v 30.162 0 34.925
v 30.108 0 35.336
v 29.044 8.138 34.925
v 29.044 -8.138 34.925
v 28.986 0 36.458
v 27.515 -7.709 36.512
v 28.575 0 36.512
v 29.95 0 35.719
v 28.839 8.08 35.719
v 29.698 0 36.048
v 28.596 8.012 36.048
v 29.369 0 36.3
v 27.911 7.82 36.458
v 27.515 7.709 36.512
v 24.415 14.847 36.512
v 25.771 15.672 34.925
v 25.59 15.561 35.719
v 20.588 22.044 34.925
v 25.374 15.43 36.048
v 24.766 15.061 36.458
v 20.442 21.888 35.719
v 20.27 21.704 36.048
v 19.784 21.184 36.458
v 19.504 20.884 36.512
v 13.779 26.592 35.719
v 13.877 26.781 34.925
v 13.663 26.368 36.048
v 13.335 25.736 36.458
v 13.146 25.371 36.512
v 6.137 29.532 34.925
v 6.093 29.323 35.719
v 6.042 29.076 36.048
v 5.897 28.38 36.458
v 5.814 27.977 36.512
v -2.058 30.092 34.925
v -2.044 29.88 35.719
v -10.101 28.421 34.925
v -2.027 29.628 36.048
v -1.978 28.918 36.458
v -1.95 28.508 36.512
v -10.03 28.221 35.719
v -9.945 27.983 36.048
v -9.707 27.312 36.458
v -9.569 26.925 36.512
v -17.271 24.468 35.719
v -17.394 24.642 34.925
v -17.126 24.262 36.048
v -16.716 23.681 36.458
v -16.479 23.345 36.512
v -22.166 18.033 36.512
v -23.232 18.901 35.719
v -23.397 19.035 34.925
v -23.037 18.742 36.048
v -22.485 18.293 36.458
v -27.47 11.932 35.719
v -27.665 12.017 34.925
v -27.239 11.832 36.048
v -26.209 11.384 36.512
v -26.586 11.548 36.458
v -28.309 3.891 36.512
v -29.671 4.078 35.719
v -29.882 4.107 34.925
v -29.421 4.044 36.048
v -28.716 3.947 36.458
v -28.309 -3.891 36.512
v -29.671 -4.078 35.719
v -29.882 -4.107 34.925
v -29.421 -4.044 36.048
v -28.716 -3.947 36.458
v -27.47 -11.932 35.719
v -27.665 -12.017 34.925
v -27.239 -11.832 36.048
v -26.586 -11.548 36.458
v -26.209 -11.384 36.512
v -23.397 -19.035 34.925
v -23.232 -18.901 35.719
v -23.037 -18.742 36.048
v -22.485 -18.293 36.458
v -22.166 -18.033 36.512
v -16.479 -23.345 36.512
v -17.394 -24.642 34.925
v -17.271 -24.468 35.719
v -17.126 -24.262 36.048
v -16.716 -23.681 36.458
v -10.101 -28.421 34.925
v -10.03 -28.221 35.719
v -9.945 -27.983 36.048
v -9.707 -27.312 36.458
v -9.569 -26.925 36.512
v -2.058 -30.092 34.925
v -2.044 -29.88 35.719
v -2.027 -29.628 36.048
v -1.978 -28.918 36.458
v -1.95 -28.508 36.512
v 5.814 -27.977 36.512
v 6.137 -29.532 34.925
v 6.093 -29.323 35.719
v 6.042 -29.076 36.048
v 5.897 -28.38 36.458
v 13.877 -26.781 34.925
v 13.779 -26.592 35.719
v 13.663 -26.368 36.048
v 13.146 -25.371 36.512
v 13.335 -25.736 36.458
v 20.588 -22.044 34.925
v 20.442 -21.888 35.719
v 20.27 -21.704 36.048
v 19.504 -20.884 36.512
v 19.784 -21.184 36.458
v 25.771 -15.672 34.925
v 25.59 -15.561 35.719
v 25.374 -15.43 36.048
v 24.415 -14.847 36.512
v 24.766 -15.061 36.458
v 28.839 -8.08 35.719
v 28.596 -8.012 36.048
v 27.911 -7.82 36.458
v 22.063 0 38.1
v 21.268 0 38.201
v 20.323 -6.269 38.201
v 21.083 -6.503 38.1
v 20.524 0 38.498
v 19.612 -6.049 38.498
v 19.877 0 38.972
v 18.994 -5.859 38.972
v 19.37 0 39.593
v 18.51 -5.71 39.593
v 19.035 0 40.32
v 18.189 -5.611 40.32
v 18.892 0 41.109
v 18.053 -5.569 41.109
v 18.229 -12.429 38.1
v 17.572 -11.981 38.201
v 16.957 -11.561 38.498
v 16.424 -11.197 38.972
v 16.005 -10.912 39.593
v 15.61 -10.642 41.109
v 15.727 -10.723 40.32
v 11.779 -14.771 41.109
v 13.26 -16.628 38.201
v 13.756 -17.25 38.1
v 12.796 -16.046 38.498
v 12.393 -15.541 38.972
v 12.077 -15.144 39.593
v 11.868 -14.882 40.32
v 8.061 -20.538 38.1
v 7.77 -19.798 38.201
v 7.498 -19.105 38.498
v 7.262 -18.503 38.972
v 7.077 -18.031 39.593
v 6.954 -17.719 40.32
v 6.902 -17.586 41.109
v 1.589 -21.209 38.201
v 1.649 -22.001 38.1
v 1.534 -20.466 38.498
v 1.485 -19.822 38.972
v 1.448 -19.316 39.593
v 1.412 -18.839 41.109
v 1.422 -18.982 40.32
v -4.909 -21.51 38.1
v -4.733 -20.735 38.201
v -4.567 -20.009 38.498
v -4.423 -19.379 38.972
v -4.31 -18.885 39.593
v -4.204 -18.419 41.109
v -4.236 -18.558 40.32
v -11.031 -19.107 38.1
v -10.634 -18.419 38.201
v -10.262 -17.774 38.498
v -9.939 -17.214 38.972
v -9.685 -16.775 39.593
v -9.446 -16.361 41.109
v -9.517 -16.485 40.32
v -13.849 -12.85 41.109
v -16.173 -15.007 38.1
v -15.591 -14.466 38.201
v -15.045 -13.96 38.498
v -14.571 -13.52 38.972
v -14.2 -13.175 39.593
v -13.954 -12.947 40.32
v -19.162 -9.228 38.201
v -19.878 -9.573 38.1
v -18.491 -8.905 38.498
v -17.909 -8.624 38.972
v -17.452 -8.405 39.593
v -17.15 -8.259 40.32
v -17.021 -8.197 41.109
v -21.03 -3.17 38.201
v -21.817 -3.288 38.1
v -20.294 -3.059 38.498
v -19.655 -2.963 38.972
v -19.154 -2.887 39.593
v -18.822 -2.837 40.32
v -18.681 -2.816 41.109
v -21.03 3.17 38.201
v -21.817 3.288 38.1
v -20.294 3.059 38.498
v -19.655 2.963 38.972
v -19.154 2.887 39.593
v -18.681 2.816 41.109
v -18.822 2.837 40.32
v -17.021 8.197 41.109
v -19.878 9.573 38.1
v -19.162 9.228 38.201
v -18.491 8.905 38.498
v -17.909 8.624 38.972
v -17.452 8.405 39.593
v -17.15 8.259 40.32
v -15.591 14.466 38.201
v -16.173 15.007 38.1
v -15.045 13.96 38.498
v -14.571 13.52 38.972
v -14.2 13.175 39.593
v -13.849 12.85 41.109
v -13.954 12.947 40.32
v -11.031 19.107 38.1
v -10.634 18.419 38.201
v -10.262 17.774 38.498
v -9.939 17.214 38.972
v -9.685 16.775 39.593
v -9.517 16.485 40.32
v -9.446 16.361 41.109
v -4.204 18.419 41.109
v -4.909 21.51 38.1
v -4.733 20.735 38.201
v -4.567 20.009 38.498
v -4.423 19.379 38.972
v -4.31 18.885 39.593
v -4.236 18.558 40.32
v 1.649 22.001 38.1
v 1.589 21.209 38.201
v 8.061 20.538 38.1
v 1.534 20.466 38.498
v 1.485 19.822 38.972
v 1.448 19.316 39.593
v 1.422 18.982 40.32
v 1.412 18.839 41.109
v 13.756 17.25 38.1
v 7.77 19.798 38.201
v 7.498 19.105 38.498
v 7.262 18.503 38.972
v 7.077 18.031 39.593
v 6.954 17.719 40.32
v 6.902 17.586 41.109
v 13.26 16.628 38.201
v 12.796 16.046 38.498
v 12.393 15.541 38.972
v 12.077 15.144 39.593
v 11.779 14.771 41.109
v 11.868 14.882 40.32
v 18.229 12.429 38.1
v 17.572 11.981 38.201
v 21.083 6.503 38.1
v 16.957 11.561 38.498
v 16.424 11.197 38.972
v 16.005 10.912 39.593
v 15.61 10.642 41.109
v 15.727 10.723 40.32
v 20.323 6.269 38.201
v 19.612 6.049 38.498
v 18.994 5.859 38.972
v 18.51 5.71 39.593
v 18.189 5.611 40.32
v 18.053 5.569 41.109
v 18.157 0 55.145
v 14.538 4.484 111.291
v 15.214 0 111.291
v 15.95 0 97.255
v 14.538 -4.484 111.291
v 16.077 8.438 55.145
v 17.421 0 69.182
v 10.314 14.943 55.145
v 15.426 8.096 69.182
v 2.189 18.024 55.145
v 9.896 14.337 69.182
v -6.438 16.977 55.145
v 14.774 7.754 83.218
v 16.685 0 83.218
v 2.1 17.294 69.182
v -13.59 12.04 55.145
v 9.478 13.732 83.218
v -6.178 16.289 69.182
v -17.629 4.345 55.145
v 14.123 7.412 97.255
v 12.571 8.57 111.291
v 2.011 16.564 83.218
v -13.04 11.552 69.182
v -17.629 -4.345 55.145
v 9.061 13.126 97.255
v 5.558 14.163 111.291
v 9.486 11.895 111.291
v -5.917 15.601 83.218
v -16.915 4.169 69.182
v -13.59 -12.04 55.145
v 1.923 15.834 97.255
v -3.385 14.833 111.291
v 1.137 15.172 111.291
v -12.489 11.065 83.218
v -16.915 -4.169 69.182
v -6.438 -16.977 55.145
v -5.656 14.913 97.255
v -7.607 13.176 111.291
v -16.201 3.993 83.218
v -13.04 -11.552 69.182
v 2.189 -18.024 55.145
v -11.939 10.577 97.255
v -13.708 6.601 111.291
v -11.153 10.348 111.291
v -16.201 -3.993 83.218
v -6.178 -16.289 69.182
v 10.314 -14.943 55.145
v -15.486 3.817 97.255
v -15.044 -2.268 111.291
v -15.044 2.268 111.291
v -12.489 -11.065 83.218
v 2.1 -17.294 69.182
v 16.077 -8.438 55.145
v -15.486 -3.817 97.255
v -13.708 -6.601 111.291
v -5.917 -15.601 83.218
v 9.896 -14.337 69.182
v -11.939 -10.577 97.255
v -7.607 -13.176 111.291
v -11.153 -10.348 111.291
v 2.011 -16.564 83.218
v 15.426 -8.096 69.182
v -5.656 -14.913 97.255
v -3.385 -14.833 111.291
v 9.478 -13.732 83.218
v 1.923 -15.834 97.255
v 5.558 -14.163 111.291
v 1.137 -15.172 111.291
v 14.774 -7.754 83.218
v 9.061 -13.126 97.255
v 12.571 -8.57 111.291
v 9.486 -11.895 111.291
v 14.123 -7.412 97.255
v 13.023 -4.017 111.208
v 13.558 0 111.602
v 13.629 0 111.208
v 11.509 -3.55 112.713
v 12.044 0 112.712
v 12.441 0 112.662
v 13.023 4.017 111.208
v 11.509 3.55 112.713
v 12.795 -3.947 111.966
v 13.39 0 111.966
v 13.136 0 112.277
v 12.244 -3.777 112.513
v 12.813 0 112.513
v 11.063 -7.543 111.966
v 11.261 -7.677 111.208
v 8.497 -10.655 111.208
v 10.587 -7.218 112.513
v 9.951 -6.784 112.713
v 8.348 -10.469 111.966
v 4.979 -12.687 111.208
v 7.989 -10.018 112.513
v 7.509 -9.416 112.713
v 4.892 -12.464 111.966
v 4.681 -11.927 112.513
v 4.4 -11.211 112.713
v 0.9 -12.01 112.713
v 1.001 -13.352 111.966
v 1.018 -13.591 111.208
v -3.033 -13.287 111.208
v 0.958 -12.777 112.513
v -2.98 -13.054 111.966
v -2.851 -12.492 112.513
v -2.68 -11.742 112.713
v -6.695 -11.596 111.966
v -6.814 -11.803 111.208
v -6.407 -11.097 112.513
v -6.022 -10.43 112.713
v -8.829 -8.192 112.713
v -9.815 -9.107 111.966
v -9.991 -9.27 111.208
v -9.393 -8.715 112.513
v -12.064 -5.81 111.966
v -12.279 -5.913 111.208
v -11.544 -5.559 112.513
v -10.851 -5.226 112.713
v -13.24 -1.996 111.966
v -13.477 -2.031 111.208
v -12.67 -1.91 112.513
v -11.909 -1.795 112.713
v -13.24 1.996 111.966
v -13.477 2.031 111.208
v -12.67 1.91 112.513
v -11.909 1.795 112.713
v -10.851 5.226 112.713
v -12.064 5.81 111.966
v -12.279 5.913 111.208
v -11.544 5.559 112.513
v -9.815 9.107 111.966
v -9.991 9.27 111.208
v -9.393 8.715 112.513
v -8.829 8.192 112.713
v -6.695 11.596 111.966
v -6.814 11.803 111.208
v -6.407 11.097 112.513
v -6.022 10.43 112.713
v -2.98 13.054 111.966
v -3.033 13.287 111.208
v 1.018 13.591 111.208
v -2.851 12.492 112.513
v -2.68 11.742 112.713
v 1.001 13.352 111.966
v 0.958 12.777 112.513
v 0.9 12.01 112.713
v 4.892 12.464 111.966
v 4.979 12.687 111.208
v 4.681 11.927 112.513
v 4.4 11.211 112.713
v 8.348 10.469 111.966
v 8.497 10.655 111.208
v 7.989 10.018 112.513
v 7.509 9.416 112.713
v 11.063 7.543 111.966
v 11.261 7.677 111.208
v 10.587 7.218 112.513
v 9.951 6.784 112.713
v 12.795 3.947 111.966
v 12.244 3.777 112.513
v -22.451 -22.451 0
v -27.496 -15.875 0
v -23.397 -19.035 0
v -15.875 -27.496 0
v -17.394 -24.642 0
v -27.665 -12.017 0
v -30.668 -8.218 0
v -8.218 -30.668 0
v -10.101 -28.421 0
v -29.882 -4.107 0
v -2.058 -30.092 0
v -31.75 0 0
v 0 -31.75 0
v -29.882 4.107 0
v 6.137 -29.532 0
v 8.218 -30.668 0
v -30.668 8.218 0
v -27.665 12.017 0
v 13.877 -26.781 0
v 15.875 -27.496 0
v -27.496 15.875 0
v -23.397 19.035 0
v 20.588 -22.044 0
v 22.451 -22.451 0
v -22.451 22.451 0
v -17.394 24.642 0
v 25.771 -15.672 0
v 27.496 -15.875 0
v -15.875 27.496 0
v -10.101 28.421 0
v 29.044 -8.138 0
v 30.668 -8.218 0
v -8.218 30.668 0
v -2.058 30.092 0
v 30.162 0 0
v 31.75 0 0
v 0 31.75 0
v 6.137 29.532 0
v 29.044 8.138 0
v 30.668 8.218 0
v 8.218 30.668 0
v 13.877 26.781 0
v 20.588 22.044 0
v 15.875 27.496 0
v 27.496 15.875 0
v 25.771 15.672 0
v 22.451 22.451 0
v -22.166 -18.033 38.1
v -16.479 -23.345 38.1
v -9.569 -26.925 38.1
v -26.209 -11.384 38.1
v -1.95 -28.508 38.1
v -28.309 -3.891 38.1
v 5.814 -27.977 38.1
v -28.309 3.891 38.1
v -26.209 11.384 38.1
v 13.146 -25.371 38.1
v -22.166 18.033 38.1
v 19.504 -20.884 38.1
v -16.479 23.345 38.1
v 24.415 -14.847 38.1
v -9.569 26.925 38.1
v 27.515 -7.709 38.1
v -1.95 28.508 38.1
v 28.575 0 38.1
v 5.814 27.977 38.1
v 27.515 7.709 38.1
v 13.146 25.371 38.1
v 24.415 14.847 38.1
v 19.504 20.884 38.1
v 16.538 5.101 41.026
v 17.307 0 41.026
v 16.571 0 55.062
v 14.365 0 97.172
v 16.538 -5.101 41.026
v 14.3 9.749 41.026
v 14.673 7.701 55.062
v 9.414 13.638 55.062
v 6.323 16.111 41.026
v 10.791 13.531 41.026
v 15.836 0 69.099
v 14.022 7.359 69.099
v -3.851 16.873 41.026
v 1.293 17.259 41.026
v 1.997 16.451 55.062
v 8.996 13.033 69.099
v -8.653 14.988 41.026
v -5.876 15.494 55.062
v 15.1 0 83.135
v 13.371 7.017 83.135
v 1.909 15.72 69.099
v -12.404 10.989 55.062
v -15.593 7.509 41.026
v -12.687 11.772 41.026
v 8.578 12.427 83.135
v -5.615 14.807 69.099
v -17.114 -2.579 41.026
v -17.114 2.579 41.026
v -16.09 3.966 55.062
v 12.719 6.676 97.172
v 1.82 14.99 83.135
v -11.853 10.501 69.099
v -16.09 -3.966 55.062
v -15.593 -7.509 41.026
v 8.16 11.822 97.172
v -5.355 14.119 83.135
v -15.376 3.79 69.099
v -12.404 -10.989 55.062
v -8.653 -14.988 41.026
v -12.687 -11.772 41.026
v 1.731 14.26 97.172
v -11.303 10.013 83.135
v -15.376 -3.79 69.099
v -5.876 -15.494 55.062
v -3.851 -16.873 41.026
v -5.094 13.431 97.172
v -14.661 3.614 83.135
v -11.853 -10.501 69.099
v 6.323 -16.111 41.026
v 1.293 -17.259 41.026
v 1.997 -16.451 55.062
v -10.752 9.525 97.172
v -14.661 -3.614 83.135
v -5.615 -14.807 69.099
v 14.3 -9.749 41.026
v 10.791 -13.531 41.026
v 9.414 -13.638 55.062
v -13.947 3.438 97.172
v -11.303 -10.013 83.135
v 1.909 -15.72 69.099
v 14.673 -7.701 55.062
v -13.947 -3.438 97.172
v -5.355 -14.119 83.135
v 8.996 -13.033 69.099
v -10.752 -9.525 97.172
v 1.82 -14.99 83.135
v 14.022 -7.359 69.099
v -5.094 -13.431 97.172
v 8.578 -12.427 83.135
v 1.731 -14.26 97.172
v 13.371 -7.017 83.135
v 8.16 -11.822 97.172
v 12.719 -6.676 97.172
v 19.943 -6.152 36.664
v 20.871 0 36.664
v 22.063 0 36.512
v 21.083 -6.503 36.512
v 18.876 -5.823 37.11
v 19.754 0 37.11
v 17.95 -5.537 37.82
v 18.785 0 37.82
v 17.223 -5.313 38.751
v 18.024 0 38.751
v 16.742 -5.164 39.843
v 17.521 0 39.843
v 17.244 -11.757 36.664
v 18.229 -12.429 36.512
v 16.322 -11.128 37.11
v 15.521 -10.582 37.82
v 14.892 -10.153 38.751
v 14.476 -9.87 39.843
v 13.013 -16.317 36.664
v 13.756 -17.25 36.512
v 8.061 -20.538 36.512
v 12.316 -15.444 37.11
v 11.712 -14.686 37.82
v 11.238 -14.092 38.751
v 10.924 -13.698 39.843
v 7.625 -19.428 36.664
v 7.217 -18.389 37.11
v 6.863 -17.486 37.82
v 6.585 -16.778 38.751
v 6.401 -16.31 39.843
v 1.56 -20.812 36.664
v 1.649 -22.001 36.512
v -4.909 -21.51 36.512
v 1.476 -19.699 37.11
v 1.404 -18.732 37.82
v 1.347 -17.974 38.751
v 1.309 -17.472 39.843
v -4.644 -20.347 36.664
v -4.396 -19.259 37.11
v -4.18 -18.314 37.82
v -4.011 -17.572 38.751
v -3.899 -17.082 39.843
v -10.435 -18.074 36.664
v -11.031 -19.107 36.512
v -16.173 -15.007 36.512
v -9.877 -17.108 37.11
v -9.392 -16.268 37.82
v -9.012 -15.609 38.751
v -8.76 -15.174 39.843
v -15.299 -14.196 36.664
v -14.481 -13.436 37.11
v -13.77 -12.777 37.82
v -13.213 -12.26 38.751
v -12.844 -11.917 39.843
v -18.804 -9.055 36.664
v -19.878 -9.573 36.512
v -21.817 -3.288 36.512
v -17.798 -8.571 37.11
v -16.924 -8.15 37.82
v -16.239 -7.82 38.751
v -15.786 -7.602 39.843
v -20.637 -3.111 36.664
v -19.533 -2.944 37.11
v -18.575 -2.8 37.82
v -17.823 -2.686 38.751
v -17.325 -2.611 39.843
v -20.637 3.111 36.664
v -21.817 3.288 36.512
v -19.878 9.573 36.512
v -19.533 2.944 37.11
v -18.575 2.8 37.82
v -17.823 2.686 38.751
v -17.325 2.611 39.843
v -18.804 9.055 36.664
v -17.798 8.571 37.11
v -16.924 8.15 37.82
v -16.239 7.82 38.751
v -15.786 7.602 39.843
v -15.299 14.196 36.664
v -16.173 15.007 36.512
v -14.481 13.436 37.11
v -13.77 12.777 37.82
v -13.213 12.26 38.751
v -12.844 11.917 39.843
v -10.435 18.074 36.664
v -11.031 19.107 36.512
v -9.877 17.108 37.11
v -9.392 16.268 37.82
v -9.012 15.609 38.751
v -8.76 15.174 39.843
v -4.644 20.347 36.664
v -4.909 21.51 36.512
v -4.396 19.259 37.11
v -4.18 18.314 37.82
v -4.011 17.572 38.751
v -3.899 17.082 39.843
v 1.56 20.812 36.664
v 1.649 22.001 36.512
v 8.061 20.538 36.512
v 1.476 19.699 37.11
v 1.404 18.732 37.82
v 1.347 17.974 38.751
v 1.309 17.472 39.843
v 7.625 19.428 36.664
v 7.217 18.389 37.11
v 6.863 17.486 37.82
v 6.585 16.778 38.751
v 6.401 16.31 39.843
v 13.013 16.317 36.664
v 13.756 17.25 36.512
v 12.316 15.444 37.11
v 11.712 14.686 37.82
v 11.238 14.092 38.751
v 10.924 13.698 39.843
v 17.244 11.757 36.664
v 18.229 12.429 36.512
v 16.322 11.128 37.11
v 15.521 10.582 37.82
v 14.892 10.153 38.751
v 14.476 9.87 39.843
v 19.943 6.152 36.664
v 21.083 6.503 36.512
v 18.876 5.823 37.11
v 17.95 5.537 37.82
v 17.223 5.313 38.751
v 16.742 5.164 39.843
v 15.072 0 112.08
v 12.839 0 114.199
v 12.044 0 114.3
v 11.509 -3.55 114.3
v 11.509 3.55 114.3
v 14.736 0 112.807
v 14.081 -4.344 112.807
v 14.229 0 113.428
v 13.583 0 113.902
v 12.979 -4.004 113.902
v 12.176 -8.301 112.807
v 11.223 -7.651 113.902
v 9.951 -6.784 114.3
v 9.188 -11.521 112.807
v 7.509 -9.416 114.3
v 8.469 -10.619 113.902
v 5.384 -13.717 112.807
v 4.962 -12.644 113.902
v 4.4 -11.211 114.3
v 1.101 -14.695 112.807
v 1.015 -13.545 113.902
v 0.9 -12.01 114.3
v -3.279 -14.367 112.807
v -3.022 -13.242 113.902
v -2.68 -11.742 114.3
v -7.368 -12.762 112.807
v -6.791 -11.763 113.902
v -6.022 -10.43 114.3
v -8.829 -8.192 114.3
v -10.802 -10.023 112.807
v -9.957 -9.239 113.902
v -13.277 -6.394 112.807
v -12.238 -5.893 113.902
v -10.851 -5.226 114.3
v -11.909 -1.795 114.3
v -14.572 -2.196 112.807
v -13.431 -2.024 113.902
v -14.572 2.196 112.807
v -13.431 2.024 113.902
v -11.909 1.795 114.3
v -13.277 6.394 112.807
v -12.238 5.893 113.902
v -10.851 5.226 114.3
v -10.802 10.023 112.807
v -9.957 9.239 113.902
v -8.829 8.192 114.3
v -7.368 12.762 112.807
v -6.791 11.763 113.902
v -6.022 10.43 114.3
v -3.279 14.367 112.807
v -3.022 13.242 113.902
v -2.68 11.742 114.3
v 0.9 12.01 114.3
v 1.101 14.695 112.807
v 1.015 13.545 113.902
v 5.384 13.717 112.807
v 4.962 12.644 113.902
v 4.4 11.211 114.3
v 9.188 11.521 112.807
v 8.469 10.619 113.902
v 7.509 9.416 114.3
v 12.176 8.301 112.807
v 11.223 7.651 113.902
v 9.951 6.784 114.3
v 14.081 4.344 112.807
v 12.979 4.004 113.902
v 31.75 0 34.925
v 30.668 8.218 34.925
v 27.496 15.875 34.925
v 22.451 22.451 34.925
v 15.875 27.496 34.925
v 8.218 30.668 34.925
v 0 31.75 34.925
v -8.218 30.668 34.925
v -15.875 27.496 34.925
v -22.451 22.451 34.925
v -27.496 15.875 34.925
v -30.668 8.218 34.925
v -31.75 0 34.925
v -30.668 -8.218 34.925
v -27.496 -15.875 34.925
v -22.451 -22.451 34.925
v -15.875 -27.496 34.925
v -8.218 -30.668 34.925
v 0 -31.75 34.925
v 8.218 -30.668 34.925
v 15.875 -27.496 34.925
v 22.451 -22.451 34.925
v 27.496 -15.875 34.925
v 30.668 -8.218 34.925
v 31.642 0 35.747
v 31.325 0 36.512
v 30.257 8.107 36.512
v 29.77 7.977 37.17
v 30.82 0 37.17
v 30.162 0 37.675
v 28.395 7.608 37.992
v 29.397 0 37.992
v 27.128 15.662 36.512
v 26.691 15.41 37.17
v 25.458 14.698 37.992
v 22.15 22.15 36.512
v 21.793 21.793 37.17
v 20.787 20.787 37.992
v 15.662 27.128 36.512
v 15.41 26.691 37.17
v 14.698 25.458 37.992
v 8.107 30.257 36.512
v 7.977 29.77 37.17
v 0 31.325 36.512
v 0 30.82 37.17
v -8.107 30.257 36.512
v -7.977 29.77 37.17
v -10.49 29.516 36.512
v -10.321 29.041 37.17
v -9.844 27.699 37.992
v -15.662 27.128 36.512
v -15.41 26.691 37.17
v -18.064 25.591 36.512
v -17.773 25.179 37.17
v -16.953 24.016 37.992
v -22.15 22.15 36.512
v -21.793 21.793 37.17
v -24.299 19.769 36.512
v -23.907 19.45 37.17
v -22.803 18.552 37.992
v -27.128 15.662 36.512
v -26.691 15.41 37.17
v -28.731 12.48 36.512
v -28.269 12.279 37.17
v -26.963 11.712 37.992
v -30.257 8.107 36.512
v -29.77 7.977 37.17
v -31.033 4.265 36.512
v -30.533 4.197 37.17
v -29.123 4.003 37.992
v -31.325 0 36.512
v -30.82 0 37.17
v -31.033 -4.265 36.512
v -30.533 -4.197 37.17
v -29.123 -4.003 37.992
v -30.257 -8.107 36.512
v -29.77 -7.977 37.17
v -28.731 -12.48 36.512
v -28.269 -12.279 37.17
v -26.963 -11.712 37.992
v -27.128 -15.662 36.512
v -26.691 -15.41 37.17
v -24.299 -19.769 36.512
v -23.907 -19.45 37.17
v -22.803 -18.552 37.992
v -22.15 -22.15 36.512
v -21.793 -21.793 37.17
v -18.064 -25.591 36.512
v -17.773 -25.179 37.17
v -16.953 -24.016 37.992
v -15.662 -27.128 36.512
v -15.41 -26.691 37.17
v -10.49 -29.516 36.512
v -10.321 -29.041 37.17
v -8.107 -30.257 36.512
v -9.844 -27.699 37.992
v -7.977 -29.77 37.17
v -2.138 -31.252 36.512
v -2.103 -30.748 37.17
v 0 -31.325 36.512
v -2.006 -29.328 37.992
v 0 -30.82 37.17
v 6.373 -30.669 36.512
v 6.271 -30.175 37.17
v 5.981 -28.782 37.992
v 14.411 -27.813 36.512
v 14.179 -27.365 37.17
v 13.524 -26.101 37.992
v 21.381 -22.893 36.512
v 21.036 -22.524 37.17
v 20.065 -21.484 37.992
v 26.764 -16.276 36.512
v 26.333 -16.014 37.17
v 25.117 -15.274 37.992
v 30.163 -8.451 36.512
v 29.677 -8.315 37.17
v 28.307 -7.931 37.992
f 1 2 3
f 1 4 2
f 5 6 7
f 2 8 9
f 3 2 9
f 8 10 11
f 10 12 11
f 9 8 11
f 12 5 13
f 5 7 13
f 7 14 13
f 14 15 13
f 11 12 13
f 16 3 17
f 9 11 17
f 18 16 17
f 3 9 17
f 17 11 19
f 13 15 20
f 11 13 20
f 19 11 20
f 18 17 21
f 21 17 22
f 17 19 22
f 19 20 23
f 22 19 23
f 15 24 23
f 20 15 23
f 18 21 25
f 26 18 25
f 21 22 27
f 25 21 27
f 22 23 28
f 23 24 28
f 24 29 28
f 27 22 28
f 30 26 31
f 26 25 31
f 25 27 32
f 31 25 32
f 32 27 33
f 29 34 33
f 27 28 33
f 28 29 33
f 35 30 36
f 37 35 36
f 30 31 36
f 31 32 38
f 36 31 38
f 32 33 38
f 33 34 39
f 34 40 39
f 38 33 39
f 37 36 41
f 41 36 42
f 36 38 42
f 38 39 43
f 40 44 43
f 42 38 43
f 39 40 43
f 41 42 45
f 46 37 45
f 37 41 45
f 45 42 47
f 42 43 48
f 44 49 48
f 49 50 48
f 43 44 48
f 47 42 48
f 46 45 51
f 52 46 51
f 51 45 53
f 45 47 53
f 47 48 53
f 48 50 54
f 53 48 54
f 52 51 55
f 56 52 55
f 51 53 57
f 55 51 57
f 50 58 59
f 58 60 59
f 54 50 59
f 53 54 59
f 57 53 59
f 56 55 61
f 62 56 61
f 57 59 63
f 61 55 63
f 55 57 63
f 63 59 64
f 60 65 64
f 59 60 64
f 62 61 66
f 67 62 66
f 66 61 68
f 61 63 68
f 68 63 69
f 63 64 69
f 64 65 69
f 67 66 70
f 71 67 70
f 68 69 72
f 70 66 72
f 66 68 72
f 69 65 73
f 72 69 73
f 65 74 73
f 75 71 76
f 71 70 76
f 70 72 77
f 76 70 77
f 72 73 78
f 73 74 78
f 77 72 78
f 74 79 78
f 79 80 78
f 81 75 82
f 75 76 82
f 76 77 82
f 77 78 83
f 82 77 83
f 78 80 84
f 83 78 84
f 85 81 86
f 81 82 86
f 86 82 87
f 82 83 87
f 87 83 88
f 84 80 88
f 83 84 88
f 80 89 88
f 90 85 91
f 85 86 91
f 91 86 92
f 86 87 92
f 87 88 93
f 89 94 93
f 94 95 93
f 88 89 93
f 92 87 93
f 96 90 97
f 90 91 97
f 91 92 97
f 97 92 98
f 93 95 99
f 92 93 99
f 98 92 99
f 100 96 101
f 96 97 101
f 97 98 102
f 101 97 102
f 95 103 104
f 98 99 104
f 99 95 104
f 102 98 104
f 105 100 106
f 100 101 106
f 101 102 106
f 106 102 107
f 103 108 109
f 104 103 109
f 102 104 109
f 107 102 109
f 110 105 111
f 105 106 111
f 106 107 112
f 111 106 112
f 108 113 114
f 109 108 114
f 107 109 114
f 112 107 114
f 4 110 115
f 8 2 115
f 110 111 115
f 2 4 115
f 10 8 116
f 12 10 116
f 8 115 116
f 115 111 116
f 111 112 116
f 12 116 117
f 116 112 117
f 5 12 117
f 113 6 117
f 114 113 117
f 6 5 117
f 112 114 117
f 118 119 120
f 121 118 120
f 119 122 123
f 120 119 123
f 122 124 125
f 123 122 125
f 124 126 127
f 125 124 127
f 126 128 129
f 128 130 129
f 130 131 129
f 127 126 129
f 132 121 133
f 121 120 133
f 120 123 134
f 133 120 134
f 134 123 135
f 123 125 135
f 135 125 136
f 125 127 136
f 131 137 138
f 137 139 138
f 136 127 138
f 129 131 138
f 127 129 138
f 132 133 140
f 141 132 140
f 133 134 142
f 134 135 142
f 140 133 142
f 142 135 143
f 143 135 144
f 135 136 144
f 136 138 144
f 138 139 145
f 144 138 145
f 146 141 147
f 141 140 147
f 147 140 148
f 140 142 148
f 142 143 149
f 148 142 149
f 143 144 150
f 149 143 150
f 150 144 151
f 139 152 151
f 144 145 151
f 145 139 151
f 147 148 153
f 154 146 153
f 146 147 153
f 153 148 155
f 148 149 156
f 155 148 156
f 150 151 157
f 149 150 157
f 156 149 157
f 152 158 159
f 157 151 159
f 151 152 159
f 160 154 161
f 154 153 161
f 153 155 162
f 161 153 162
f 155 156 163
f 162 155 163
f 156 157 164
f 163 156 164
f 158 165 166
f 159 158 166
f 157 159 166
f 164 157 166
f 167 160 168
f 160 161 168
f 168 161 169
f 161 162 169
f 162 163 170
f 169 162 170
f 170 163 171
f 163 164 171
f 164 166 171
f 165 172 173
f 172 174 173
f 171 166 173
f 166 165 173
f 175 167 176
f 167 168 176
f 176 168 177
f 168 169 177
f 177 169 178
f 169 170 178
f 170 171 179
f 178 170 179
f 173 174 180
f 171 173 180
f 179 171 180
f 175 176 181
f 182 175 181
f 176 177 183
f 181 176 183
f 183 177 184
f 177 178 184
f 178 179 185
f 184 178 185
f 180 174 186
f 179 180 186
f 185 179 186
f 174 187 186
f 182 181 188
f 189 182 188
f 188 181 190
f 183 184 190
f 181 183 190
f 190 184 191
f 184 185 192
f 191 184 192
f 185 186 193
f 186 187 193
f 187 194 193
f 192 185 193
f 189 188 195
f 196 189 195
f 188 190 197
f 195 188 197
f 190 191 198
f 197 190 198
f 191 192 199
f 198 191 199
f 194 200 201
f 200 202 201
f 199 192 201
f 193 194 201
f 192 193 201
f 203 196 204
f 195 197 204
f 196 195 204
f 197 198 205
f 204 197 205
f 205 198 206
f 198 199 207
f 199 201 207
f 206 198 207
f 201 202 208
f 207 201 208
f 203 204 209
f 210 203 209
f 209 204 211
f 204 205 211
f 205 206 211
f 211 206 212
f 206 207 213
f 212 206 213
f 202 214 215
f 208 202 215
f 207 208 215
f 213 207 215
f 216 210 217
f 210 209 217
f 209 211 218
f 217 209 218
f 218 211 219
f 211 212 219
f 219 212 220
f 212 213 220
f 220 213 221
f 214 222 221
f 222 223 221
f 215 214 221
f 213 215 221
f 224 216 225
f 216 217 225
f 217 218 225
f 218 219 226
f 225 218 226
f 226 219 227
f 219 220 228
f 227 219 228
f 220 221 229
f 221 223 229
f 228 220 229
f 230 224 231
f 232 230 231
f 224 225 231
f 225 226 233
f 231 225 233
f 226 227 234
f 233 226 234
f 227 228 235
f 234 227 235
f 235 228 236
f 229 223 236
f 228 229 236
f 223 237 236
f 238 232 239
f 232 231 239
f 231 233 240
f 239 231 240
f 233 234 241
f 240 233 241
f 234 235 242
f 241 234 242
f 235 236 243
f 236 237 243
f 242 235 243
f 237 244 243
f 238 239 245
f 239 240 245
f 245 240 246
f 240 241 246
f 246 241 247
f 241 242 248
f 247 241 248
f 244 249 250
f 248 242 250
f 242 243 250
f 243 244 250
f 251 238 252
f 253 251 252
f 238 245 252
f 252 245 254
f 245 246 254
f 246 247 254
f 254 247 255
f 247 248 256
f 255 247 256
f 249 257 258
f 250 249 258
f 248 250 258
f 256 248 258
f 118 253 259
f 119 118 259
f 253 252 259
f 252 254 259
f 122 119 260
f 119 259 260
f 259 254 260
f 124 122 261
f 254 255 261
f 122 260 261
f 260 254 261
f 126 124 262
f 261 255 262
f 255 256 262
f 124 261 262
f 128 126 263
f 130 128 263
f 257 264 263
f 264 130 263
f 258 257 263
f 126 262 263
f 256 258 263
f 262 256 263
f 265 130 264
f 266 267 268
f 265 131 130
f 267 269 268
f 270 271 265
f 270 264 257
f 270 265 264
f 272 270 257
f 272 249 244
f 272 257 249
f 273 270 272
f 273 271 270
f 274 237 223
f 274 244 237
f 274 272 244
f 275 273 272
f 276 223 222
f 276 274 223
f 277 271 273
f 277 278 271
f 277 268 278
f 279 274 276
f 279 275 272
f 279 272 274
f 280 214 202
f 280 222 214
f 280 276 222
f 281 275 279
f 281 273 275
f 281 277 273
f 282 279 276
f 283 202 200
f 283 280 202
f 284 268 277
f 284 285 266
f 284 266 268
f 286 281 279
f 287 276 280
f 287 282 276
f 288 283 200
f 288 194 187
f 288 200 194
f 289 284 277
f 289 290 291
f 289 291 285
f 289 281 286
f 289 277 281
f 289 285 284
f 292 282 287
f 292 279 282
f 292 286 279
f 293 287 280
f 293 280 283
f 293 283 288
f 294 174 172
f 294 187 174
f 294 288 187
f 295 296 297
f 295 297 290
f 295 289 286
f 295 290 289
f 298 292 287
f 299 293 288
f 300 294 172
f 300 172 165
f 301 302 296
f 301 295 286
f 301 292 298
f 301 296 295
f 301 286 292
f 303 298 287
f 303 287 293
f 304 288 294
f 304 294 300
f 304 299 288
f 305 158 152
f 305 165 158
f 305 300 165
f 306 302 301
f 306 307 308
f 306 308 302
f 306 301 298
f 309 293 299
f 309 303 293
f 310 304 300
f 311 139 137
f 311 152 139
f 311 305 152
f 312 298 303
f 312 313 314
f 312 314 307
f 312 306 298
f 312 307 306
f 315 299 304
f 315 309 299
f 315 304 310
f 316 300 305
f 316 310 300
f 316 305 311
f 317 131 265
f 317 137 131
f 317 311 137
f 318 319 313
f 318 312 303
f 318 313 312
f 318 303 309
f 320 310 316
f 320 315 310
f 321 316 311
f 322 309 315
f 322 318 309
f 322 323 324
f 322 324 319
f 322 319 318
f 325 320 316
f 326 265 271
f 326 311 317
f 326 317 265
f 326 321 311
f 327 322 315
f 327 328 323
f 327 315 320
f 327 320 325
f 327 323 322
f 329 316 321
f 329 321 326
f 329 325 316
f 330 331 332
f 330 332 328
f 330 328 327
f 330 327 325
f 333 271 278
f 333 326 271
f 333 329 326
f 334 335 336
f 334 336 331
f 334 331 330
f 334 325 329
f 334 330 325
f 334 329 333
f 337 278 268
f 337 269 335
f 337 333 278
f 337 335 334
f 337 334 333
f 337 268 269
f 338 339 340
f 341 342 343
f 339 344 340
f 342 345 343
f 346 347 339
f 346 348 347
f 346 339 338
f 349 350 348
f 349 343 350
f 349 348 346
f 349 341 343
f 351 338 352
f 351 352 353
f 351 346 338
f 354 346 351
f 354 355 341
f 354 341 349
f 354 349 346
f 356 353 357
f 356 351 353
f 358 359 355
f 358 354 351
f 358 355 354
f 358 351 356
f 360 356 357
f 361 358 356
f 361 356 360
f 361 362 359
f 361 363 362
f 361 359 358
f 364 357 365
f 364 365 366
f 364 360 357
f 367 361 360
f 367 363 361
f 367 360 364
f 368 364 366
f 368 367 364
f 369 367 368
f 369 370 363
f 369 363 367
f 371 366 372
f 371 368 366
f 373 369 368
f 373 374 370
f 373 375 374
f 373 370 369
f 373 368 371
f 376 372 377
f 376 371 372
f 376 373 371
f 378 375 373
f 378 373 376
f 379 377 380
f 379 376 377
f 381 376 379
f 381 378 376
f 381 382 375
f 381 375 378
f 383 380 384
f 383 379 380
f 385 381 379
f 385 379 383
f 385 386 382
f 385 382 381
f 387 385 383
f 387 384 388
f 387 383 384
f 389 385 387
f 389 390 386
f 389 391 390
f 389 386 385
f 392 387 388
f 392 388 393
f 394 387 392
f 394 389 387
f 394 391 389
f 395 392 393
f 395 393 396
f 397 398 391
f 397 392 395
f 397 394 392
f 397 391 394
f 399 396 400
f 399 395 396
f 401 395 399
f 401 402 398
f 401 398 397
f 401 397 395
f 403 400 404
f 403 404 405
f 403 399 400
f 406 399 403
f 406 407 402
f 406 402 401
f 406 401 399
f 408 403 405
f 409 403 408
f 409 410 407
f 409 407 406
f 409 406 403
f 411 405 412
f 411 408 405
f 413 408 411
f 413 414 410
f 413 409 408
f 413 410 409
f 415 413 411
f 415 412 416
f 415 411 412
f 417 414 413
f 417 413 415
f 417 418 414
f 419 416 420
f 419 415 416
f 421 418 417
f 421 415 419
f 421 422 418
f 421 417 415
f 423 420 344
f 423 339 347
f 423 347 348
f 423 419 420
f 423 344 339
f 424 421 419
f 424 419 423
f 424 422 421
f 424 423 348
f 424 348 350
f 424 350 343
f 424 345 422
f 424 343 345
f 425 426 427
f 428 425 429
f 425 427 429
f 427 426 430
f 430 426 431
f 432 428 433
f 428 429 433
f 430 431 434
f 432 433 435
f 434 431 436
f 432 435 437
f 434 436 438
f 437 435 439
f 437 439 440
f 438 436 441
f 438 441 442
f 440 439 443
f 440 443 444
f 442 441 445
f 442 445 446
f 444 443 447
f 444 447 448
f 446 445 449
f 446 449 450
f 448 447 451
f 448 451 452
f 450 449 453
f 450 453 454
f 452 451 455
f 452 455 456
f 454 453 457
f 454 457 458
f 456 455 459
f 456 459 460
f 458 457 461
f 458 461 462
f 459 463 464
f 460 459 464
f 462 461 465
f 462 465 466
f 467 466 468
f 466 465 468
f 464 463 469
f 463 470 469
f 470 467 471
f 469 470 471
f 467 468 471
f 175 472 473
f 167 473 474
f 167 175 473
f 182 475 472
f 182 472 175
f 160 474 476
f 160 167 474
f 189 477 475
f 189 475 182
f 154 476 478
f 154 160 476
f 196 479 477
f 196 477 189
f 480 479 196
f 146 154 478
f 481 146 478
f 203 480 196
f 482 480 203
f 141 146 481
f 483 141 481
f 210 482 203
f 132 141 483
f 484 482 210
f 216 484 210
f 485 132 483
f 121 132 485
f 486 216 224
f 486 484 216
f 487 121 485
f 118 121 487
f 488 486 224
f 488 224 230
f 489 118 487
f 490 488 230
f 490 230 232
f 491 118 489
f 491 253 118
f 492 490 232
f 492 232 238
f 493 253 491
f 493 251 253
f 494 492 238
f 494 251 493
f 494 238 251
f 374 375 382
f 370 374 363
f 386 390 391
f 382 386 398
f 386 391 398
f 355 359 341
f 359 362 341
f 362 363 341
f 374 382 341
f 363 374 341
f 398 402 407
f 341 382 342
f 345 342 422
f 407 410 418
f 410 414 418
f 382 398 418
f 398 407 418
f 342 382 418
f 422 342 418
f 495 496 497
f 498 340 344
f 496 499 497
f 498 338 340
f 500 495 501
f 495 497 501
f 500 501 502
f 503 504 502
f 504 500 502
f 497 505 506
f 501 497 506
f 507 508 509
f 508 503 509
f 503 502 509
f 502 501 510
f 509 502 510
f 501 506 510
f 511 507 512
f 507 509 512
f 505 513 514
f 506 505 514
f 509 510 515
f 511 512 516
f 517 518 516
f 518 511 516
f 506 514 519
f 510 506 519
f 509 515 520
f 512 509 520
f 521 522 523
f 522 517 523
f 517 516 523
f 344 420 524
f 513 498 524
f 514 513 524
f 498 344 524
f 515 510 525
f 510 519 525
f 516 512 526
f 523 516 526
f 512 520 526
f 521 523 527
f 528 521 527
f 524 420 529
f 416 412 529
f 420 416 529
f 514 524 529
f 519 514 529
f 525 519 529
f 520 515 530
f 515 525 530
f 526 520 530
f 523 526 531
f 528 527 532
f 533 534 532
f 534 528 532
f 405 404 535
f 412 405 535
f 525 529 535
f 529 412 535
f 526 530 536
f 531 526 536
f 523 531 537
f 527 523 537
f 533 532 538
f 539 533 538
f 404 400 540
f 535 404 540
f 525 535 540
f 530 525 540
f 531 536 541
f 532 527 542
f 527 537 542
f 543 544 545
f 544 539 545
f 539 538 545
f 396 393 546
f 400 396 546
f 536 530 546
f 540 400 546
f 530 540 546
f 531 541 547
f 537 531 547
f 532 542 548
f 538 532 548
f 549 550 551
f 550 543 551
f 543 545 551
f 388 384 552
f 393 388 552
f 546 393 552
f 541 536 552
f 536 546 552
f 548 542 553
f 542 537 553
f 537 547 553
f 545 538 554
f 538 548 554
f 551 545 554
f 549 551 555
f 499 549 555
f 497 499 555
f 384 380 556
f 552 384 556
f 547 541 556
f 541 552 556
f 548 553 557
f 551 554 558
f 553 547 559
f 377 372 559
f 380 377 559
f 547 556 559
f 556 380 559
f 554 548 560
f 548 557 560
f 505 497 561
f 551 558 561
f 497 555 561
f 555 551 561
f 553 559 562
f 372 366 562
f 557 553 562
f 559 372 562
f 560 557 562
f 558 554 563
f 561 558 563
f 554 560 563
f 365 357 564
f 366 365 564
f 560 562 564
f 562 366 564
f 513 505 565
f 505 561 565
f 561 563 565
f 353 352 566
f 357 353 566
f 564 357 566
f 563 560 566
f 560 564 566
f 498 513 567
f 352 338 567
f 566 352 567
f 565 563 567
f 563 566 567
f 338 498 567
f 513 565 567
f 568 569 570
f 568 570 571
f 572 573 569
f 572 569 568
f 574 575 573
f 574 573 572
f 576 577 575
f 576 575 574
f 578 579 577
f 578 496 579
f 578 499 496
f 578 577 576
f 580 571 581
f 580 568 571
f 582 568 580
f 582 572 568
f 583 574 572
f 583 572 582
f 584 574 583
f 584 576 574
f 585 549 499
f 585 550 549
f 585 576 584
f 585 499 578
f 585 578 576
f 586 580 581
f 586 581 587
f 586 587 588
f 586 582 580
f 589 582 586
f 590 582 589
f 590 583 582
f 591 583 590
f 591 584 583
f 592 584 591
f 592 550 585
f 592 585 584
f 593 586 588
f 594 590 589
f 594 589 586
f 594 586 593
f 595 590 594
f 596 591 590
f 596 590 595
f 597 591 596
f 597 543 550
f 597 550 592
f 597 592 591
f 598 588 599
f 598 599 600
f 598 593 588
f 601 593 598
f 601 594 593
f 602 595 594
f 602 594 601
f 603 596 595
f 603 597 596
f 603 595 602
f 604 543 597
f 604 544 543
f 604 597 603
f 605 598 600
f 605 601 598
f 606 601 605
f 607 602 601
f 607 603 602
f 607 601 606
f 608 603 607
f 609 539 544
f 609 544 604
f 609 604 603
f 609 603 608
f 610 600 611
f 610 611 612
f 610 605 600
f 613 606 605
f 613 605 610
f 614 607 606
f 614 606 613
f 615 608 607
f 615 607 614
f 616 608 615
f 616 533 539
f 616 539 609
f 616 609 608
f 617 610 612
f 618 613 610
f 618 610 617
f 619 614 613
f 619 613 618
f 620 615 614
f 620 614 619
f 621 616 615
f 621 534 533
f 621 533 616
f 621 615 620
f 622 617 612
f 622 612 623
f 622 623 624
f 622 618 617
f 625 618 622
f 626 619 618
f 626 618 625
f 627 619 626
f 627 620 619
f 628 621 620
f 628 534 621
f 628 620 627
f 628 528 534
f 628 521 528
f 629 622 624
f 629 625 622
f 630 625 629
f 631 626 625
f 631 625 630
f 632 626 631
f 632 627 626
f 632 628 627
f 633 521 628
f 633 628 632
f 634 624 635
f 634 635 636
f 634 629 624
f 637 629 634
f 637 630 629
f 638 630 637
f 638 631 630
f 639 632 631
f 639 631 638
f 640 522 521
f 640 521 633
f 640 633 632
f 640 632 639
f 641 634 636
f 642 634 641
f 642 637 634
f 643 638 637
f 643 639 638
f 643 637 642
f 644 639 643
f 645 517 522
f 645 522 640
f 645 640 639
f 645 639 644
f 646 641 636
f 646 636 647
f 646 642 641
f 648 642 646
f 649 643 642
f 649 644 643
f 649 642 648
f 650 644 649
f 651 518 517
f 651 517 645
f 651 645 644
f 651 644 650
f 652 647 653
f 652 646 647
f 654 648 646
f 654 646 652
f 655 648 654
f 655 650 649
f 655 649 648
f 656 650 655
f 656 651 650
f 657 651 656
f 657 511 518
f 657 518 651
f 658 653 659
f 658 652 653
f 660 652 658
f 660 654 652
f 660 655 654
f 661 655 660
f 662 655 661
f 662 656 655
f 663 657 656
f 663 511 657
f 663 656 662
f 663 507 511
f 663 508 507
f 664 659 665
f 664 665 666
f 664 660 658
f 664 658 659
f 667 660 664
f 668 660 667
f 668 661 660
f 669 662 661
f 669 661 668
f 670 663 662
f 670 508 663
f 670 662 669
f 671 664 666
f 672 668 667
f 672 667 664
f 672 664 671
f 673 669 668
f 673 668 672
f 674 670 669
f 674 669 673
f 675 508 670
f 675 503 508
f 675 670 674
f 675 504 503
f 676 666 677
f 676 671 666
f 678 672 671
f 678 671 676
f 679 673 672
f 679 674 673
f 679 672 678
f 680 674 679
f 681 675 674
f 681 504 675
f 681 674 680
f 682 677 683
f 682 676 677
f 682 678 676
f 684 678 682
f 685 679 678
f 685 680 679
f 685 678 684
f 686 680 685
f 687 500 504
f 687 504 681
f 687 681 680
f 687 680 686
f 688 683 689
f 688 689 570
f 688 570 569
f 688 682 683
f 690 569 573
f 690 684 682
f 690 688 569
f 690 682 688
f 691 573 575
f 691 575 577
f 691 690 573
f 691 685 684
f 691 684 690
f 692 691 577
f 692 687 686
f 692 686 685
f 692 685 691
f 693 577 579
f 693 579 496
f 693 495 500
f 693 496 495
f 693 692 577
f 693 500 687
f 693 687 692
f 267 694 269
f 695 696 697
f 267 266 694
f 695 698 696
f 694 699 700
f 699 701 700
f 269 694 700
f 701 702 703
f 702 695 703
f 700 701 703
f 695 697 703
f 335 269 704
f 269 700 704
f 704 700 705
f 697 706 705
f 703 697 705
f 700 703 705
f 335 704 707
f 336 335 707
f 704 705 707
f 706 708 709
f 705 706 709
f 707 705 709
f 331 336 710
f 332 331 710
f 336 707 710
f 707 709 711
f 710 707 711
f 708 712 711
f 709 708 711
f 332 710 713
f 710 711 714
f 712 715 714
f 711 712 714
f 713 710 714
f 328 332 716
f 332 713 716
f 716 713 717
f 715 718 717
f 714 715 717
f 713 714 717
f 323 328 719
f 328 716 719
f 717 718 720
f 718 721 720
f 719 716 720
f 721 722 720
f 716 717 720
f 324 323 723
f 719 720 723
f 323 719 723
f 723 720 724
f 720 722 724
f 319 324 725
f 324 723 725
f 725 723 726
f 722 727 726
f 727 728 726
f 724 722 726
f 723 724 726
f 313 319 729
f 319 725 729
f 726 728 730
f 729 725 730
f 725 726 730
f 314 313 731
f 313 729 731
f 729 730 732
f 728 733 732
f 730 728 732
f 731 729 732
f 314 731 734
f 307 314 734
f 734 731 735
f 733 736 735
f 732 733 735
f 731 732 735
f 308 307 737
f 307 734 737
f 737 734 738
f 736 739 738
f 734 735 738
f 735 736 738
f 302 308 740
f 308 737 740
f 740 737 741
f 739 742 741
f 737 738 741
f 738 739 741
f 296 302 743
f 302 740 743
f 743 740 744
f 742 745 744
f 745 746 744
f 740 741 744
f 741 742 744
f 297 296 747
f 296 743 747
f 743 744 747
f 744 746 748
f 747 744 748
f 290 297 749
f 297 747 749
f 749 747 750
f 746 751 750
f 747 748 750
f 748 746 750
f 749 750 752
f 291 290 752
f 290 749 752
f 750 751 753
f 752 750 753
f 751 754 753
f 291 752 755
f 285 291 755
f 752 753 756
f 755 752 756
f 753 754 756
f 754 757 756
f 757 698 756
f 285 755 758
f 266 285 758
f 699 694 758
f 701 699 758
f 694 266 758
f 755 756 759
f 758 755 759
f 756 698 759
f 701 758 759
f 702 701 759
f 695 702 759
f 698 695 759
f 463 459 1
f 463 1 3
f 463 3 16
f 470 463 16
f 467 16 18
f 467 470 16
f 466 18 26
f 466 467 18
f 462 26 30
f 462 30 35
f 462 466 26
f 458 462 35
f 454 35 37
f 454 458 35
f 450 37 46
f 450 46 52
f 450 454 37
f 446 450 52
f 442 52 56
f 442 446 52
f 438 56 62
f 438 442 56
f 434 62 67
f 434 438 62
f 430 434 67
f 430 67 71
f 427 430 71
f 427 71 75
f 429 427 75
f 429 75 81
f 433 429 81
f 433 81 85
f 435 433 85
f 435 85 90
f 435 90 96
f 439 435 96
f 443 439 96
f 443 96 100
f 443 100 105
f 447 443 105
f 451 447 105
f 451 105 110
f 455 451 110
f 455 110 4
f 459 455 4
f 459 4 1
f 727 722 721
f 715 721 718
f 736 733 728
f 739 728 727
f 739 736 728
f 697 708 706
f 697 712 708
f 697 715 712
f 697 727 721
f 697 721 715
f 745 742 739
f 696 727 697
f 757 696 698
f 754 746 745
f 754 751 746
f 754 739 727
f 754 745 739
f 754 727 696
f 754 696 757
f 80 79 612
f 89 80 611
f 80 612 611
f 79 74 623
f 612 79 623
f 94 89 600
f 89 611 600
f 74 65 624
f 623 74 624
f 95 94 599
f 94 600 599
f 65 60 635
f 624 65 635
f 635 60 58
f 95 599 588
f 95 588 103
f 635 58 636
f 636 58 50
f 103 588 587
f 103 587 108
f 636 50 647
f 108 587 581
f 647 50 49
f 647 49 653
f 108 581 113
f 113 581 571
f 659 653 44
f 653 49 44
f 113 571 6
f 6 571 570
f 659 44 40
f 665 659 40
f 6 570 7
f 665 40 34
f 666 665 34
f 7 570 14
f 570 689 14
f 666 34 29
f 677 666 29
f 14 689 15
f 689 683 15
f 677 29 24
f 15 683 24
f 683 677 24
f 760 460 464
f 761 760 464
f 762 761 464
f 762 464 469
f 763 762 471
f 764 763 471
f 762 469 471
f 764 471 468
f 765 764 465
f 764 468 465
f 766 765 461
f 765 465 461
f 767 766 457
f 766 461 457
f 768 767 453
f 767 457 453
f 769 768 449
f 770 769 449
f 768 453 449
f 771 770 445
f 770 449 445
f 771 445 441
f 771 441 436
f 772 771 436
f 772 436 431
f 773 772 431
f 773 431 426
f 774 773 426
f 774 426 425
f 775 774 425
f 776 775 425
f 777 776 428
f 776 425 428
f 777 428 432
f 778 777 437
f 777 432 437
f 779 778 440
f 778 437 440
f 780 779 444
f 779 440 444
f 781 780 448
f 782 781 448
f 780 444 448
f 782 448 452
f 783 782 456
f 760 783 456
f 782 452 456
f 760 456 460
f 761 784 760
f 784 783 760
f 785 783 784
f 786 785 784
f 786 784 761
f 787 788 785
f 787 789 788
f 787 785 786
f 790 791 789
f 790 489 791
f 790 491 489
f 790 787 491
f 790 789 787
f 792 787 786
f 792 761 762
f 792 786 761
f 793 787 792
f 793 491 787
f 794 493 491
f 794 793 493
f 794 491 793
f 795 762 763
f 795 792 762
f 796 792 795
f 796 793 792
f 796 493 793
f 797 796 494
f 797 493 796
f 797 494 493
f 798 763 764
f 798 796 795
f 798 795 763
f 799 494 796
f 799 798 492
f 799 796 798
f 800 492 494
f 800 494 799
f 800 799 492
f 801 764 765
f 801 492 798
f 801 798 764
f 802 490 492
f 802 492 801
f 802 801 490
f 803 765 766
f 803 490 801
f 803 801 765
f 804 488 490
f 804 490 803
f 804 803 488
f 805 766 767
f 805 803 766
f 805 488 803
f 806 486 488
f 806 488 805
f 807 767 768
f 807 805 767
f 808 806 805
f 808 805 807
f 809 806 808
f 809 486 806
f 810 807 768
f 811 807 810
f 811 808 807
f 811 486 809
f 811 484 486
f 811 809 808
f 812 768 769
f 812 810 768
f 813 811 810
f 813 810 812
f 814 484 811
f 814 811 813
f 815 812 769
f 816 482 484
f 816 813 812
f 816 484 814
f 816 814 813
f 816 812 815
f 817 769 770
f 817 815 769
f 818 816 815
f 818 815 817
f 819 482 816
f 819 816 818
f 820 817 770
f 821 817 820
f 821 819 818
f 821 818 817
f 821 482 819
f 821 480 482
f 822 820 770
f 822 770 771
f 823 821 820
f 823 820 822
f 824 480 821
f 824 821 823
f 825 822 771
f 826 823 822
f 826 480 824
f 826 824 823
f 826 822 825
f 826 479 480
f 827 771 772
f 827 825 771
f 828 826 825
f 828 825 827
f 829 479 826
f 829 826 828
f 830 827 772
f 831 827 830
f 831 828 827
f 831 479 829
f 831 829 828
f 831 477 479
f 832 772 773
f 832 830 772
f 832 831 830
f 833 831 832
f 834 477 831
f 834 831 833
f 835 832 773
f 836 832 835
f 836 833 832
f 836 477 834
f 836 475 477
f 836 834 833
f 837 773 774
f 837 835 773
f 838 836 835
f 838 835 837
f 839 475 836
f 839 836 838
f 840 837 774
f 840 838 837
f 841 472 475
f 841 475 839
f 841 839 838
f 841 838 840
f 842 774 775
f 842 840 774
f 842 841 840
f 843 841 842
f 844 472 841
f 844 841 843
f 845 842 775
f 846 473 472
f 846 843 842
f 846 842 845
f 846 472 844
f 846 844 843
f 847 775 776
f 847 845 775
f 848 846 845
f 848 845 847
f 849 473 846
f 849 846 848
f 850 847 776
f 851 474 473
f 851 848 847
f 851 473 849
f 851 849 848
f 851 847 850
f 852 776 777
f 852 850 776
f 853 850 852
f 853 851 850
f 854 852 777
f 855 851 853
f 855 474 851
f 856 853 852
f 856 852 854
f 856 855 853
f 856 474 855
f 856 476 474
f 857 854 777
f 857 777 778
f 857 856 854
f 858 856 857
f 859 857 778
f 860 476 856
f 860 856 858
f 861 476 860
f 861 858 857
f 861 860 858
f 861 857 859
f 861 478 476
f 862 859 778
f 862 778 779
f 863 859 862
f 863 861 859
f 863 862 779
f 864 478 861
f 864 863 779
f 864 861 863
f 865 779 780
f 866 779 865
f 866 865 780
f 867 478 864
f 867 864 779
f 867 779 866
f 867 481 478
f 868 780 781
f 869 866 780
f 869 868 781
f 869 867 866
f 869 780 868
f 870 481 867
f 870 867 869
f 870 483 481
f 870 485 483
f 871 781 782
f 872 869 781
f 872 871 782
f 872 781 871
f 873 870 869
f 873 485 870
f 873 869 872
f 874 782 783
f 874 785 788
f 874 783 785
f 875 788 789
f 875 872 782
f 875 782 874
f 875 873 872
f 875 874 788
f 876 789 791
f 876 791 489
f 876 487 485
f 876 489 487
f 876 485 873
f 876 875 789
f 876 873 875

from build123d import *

# Parameters (mm, degrees)
F3_R     = 31.75
F0_DEPTH = 38.1
F1_R     = 19.05
F4_DEPTH = 76.2
F4_TAPER = 3
F2_R     = 3.175
F5_T     = -1.5875


with BuildPart() as f0:
    # F3 (on Top) → F0 (new body)
    with BuildSketch(Plane.XY):
        Circle(F3_R)
    extrude(amount=F0_DEPTH)

    # F1 (on face) → F4 (join)
    with BuildSketch(Plane.XY.offset(38.1)):
        Circle(F1_R)
    extrude(amount=F4_DEPTH, taper=F4_TAPER)

    # F2
    f2_edges = [f0.edges().sort_by_distance(p)[0] for p in [
        (-19.05, 0, 38.1),
        (17.053264, 0, 76.2),
        (-15.056527, 0, 114.3),
        (-31.75, 0, 38.1),
    ]]
    fillet(f2_edges, radius=F2_R)

    # F5
    f5_openings = [f0.faces().sort_by_distance(p)[0] for p in [
        (0, 0, 0),
    ]]
    offset(amount=F5_T, openings=f5_openings)


solid = f0.part
